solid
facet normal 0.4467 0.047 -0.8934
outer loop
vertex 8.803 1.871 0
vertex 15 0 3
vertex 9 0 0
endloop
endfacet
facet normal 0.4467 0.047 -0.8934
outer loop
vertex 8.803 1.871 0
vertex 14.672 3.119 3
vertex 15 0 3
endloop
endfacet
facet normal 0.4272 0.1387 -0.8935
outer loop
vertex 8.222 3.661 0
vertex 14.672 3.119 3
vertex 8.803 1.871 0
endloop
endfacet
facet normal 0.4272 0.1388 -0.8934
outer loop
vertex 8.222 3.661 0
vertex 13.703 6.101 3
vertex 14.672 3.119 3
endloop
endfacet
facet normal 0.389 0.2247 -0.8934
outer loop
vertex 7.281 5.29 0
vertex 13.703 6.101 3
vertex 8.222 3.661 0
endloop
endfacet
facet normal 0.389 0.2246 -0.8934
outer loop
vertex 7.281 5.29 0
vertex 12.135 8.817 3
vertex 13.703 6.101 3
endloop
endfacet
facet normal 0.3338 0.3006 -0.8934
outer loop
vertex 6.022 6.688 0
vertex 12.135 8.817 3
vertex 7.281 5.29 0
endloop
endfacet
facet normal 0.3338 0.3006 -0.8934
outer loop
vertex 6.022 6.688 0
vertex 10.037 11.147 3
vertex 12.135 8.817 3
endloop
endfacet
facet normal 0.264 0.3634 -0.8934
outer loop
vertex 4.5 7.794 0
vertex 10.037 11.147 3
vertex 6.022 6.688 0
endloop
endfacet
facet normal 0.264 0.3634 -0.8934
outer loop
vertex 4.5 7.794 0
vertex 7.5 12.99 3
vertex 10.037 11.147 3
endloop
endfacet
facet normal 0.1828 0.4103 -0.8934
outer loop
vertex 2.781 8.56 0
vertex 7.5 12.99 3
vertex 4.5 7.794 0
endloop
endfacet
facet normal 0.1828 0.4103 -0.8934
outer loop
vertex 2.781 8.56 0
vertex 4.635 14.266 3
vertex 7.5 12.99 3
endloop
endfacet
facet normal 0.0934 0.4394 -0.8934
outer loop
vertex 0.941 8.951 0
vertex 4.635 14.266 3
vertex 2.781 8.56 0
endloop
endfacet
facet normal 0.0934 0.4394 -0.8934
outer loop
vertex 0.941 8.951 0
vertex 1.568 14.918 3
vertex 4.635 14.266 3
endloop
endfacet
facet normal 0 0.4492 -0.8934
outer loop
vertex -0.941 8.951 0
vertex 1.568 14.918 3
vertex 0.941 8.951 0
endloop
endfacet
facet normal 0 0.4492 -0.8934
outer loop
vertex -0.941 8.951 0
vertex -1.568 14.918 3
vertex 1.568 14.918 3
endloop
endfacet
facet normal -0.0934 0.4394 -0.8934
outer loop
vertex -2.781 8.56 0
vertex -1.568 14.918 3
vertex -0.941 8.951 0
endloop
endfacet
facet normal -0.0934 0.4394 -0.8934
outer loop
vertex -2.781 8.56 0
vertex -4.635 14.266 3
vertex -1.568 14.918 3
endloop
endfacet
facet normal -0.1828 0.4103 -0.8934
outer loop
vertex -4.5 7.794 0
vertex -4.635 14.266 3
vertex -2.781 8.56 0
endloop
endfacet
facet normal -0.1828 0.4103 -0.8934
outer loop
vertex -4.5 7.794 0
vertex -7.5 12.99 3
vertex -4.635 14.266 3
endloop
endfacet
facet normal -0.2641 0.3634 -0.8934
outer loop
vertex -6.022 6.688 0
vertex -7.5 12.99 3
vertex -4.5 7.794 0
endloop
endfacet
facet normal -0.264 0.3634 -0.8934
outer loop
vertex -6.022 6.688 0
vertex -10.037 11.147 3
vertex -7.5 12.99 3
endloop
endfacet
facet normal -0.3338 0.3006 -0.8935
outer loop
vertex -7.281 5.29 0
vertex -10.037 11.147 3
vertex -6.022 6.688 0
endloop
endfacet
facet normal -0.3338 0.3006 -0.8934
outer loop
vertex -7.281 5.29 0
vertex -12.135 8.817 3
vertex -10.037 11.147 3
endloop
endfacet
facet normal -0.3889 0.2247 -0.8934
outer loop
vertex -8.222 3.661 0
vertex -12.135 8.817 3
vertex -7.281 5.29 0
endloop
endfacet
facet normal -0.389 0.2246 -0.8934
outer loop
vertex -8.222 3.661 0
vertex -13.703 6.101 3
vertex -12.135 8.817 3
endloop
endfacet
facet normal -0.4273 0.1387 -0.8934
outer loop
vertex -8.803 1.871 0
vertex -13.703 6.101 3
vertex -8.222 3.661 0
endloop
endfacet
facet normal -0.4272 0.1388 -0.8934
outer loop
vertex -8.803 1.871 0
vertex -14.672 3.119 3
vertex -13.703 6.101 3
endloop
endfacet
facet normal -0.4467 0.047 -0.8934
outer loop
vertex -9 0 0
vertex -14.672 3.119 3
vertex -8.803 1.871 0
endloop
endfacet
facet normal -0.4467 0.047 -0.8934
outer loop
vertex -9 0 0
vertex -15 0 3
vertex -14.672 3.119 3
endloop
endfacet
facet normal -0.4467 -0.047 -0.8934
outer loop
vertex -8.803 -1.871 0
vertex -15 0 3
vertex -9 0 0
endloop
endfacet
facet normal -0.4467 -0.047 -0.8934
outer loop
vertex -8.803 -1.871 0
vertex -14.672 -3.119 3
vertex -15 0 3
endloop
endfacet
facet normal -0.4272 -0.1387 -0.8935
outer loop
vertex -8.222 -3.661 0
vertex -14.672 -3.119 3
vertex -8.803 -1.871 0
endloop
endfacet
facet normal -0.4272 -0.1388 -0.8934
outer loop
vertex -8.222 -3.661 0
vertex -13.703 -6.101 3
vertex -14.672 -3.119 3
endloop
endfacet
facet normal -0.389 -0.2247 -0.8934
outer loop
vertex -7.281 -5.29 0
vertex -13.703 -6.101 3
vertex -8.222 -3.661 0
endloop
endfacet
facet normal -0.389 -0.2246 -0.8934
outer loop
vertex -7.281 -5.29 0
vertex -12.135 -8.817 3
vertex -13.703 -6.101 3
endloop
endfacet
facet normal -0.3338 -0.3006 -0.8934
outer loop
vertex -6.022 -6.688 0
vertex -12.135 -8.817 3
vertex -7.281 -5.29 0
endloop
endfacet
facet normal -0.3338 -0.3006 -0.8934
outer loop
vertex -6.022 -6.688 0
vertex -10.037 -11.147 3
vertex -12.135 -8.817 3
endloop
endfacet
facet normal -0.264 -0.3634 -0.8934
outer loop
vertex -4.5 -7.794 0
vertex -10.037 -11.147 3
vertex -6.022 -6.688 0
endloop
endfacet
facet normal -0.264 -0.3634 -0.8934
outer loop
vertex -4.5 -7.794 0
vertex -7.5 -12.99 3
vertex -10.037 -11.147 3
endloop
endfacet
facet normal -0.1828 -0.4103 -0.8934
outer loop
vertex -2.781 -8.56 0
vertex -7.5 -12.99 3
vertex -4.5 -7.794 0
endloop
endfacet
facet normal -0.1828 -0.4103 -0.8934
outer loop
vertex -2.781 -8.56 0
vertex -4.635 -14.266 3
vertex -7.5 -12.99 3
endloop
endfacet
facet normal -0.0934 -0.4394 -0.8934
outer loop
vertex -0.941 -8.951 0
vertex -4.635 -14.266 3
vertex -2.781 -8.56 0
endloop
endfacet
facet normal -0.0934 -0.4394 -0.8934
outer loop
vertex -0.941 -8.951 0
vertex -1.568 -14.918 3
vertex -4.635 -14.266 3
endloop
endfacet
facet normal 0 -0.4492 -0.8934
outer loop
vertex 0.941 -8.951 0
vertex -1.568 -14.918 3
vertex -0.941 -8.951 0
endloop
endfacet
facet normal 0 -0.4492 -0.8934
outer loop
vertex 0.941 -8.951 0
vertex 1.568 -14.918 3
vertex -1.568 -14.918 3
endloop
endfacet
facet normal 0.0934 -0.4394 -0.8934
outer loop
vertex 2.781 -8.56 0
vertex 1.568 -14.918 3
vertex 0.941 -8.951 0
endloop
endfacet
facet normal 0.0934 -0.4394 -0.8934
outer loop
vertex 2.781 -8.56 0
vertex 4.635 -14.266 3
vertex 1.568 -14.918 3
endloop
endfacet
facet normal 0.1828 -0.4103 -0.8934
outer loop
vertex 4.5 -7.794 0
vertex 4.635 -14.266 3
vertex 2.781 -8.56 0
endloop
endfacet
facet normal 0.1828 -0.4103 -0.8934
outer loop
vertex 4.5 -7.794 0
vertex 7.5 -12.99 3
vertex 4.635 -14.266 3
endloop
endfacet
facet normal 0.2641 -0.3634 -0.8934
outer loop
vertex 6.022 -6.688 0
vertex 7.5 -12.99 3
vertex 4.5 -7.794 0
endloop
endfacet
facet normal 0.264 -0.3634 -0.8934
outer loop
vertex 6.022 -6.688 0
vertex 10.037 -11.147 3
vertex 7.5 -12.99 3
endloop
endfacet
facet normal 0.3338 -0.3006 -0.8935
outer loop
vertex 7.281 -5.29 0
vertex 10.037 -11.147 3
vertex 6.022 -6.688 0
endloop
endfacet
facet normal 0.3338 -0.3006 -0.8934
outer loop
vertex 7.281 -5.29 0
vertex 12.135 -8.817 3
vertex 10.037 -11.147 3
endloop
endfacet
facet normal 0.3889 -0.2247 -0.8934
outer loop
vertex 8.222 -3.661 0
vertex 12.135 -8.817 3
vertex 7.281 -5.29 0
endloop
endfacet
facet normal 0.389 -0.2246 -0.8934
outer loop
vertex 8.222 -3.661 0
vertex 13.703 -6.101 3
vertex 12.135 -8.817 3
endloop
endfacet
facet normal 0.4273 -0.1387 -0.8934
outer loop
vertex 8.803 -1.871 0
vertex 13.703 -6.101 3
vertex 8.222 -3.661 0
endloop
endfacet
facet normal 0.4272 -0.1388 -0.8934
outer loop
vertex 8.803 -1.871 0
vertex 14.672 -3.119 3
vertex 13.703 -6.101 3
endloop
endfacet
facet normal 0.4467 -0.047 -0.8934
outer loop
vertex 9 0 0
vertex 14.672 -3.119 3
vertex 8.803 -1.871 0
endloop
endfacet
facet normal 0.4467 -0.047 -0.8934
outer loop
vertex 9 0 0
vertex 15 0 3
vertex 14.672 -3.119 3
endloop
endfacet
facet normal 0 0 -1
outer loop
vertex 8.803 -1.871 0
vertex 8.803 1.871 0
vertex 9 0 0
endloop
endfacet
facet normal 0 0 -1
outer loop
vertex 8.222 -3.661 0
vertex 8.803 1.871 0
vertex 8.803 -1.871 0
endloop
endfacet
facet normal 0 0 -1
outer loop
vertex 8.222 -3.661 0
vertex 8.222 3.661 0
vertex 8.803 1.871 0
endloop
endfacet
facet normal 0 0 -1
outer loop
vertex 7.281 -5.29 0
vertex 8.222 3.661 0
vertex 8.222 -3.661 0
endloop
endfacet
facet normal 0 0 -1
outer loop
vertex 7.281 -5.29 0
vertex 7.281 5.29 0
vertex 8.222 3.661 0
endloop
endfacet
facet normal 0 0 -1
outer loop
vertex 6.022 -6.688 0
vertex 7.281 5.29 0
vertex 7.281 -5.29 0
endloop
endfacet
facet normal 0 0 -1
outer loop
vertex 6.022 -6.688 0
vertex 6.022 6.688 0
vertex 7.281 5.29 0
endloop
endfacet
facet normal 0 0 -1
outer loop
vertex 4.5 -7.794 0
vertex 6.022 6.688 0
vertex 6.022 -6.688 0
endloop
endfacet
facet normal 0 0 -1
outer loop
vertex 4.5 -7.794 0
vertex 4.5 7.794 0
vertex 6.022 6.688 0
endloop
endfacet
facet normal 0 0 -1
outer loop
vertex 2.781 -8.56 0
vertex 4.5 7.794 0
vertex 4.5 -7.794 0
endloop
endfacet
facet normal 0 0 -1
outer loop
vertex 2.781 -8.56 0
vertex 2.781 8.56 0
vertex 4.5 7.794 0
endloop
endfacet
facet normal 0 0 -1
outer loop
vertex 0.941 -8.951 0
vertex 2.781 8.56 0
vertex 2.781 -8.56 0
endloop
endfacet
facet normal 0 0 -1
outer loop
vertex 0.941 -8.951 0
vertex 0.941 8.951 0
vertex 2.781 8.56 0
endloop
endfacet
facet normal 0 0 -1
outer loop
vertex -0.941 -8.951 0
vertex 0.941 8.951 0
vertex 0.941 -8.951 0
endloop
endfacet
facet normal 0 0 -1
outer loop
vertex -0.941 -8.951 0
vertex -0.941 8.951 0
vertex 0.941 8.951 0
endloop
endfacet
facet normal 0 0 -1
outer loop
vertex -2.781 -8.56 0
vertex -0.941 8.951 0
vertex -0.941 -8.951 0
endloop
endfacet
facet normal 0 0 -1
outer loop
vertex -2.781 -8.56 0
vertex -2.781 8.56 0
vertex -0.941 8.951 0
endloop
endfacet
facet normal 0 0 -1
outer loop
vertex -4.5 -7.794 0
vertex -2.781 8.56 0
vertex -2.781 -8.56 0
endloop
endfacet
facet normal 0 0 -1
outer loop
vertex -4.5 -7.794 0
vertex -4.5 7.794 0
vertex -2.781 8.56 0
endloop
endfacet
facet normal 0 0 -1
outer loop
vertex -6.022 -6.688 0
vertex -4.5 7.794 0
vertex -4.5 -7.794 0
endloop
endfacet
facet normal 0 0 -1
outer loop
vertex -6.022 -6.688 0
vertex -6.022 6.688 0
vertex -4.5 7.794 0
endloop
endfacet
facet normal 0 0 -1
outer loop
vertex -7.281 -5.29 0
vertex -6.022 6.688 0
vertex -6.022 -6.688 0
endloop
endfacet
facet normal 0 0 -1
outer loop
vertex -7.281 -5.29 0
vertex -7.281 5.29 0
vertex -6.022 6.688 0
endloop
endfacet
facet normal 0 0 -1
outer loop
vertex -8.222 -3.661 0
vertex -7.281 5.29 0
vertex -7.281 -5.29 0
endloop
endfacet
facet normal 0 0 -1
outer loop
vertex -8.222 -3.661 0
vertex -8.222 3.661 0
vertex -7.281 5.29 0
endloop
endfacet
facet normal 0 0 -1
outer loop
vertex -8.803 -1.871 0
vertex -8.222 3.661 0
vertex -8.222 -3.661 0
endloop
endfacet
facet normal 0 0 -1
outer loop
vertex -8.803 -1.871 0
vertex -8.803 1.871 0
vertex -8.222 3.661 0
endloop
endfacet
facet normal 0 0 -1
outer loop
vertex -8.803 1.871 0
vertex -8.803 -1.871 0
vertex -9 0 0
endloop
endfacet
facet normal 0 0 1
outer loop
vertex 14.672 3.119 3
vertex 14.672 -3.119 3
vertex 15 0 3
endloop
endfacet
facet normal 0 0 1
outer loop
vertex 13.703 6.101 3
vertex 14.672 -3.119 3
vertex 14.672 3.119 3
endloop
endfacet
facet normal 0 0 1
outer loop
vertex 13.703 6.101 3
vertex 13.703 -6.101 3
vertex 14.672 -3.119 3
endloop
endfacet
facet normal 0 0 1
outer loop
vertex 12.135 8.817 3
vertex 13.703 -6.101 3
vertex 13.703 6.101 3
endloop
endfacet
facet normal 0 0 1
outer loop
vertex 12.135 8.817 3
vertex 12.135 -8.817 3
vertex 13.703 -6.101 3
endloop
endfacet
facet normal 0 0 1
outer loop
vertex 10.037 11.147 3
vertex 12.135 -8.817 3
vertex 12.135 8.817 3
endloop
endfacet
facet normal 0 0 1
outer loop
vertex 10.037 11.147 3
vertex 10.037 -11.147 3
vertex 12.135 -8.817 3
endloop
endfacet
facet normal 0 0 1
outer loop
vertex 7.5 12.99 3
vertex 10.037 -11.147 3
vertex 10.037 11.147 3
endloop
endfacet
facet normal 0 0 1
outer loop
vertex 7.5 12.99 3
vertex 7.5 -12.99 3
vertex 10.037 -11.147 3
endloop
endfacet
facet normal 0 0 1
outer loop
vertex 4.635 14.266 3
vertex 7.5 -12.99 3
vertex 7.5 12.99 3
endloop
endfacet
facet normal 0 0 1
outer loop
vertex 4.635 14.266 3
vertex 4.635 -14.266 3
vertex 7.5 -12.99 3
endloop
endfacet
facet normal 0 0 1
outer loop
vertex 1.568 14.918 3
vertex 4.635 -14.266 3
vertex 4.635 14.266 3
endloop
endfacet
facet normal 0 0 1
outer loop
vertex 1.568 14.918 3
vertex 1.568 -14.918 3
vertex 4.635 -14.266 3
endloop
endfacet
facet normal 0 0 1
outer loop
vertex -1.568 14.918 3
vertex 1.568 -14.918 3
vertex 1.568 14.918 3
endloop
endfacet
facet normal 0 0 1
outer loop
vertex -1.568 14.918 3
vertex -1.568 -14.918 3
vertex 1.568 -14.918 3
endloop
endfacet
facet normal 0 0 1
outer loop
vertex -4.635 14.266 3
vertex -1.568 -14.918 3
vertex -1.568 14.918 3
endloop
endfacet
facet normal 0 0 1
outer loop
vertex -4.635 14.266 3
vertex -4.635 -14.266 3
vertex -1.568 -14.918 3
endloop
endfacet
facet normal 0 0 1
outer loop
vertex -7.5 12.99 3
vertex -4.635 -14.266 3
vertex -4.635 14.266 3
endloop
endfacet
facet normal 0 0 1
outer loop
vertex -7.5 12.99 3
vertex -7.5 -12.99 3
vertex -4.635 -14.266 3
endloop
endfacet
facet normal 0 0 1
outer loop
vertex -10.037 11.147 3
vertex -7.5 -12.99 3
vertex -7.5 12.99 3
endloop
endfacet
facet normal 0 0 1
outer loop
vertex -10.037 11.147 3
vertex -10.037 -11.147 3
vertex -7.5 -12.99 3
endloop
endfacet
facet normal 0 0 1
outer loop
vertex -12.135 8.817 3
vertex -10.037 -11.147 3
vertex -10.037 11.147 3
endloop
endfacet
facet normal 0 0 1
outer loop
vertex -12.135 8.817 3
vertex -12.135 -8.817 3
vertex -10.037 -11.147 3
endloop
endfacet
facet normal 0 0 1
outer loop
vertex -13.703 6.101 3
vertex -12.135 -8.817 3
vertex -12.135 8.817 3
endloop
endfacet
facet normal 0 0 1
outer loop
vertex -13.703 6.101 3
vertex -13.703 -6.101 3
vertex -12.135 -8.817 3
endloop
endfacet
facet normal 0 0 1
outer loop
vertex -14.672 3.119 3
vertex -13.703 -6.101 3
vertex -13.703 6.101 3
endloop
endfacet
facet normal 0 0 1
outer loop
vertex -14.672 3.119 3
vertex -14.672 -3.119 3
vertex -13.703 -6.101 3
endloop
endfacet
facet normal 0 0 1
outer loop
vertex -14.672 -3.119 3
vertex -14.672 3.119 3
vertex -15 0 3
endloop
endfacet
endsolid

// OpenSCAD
// Generated by SolidPython 1.0.1 on 2020-07-29 00:02:42


cylinder(h = 3, r1 = 9, r2 = 15);
/***********************************************
*********      SolidPython code:      **********
************************************************
 
# import packages: SolidPython
from solid import *
from solid.utils import *
from itertools import chain, combinations


class Resize:

    def __init__(self, scad_file):
        self.scad_file = scad_file
        #self.scad_file = import_scad(scad_file)
        # cone/cylinder param:
        self.r1 = 0
        self.r2 = 0
        self.h = 0
        # rectangular prism param:
        self.w = 0
        self.l = 0
        # ellipse param:
        self.r = 0

    # import OpenScad code (file name corresponds to shape)


    # classify shape + parameters
    def assign(self, param1, param2, param3):
        if self.scad_file == 'cone.scad':
            self.r1 = param1
            self.r2 = param2
            self.h = param3
        elif self.scad_file == 'cylinder.scad':
            self.r1 = param1
            self.r2 = param2
            self.h = param3
        elif self.scad_file == 'rectangularPrism.scad':
            self.h = param1
            self.l = param2
            self.w = param3
        else:
            self.r = param1
            self.h = param2

    # resize parameters
    def iterate(self):
        x = range(3, 20, 2)
        i = 1
        if self.scad_file == 'cone.scad':
            tempList = list(combinations(x, 3))
            #print(tempList)
            for i in x:
                for j in range (3):
                    param1 = tempList[i][0]
                    param2 = tempList[i][1]
                    param3 = tempList[i][2]
                    filepath = 'produced_scad_files/' + 'cone' + str(param1) + '_' + str(param2) + '_' + str(param3) + '.scad'
                    scad_render_to_file(cylinder(h=param1, r1=param2, r2=param3), filepath)

        elif self.scad_file == 'cylinder.scad':
            tempList = list(combinations(x, 3))
            for i in x:
                for j in range(3):
                    param1 = tempList[i][0]
                    param2 = tempList[i][1]
                    param3 = tempList[i][2]
                    filepath = 'produced_scad_files/' + 'cylinder' + str(param1) + '_' + str(param2) + '_' + str(param3) + '.scad'
                    scad_render_to_file(cylinder(h=param1, r1=param2, r2=param3), filepath)

        elif self.scad_file == 'rectangularPrism.scad':
            tempList = list(combinations(x, 3))
            for i in x:
                for j in range(3):
                    param1 = tempList[i][0]
                    param2 = tempList[i][1]
                    param3 = tempList[i][2]
                    filepath = 'produced_scad_files/' + 'rectangularPrism' + str(param1) + '_' + str(param2) + '_' + str(
                        param3) + '.scad'
                    scad_render_to_file(cube(size=(param1, param2, param3)), filepath)

        else:
            tempList = list(combinations(x, 2))
            for i in x:
                for j in range(3):
                    param1 = tempList[i][0]
                    param2 = tempList[i][1]
                    filepath = 'produced_scad_files/' + 'ellipse' + str(param1) + '_' + str(param2) + '_' + '.scad'
                    scad_render_to_file(sphere(param1, param2), filepath)

    def render_to_scadfile(self):
        scad_render_to_file(scad, 'example.scad') 
 
************************************************/
